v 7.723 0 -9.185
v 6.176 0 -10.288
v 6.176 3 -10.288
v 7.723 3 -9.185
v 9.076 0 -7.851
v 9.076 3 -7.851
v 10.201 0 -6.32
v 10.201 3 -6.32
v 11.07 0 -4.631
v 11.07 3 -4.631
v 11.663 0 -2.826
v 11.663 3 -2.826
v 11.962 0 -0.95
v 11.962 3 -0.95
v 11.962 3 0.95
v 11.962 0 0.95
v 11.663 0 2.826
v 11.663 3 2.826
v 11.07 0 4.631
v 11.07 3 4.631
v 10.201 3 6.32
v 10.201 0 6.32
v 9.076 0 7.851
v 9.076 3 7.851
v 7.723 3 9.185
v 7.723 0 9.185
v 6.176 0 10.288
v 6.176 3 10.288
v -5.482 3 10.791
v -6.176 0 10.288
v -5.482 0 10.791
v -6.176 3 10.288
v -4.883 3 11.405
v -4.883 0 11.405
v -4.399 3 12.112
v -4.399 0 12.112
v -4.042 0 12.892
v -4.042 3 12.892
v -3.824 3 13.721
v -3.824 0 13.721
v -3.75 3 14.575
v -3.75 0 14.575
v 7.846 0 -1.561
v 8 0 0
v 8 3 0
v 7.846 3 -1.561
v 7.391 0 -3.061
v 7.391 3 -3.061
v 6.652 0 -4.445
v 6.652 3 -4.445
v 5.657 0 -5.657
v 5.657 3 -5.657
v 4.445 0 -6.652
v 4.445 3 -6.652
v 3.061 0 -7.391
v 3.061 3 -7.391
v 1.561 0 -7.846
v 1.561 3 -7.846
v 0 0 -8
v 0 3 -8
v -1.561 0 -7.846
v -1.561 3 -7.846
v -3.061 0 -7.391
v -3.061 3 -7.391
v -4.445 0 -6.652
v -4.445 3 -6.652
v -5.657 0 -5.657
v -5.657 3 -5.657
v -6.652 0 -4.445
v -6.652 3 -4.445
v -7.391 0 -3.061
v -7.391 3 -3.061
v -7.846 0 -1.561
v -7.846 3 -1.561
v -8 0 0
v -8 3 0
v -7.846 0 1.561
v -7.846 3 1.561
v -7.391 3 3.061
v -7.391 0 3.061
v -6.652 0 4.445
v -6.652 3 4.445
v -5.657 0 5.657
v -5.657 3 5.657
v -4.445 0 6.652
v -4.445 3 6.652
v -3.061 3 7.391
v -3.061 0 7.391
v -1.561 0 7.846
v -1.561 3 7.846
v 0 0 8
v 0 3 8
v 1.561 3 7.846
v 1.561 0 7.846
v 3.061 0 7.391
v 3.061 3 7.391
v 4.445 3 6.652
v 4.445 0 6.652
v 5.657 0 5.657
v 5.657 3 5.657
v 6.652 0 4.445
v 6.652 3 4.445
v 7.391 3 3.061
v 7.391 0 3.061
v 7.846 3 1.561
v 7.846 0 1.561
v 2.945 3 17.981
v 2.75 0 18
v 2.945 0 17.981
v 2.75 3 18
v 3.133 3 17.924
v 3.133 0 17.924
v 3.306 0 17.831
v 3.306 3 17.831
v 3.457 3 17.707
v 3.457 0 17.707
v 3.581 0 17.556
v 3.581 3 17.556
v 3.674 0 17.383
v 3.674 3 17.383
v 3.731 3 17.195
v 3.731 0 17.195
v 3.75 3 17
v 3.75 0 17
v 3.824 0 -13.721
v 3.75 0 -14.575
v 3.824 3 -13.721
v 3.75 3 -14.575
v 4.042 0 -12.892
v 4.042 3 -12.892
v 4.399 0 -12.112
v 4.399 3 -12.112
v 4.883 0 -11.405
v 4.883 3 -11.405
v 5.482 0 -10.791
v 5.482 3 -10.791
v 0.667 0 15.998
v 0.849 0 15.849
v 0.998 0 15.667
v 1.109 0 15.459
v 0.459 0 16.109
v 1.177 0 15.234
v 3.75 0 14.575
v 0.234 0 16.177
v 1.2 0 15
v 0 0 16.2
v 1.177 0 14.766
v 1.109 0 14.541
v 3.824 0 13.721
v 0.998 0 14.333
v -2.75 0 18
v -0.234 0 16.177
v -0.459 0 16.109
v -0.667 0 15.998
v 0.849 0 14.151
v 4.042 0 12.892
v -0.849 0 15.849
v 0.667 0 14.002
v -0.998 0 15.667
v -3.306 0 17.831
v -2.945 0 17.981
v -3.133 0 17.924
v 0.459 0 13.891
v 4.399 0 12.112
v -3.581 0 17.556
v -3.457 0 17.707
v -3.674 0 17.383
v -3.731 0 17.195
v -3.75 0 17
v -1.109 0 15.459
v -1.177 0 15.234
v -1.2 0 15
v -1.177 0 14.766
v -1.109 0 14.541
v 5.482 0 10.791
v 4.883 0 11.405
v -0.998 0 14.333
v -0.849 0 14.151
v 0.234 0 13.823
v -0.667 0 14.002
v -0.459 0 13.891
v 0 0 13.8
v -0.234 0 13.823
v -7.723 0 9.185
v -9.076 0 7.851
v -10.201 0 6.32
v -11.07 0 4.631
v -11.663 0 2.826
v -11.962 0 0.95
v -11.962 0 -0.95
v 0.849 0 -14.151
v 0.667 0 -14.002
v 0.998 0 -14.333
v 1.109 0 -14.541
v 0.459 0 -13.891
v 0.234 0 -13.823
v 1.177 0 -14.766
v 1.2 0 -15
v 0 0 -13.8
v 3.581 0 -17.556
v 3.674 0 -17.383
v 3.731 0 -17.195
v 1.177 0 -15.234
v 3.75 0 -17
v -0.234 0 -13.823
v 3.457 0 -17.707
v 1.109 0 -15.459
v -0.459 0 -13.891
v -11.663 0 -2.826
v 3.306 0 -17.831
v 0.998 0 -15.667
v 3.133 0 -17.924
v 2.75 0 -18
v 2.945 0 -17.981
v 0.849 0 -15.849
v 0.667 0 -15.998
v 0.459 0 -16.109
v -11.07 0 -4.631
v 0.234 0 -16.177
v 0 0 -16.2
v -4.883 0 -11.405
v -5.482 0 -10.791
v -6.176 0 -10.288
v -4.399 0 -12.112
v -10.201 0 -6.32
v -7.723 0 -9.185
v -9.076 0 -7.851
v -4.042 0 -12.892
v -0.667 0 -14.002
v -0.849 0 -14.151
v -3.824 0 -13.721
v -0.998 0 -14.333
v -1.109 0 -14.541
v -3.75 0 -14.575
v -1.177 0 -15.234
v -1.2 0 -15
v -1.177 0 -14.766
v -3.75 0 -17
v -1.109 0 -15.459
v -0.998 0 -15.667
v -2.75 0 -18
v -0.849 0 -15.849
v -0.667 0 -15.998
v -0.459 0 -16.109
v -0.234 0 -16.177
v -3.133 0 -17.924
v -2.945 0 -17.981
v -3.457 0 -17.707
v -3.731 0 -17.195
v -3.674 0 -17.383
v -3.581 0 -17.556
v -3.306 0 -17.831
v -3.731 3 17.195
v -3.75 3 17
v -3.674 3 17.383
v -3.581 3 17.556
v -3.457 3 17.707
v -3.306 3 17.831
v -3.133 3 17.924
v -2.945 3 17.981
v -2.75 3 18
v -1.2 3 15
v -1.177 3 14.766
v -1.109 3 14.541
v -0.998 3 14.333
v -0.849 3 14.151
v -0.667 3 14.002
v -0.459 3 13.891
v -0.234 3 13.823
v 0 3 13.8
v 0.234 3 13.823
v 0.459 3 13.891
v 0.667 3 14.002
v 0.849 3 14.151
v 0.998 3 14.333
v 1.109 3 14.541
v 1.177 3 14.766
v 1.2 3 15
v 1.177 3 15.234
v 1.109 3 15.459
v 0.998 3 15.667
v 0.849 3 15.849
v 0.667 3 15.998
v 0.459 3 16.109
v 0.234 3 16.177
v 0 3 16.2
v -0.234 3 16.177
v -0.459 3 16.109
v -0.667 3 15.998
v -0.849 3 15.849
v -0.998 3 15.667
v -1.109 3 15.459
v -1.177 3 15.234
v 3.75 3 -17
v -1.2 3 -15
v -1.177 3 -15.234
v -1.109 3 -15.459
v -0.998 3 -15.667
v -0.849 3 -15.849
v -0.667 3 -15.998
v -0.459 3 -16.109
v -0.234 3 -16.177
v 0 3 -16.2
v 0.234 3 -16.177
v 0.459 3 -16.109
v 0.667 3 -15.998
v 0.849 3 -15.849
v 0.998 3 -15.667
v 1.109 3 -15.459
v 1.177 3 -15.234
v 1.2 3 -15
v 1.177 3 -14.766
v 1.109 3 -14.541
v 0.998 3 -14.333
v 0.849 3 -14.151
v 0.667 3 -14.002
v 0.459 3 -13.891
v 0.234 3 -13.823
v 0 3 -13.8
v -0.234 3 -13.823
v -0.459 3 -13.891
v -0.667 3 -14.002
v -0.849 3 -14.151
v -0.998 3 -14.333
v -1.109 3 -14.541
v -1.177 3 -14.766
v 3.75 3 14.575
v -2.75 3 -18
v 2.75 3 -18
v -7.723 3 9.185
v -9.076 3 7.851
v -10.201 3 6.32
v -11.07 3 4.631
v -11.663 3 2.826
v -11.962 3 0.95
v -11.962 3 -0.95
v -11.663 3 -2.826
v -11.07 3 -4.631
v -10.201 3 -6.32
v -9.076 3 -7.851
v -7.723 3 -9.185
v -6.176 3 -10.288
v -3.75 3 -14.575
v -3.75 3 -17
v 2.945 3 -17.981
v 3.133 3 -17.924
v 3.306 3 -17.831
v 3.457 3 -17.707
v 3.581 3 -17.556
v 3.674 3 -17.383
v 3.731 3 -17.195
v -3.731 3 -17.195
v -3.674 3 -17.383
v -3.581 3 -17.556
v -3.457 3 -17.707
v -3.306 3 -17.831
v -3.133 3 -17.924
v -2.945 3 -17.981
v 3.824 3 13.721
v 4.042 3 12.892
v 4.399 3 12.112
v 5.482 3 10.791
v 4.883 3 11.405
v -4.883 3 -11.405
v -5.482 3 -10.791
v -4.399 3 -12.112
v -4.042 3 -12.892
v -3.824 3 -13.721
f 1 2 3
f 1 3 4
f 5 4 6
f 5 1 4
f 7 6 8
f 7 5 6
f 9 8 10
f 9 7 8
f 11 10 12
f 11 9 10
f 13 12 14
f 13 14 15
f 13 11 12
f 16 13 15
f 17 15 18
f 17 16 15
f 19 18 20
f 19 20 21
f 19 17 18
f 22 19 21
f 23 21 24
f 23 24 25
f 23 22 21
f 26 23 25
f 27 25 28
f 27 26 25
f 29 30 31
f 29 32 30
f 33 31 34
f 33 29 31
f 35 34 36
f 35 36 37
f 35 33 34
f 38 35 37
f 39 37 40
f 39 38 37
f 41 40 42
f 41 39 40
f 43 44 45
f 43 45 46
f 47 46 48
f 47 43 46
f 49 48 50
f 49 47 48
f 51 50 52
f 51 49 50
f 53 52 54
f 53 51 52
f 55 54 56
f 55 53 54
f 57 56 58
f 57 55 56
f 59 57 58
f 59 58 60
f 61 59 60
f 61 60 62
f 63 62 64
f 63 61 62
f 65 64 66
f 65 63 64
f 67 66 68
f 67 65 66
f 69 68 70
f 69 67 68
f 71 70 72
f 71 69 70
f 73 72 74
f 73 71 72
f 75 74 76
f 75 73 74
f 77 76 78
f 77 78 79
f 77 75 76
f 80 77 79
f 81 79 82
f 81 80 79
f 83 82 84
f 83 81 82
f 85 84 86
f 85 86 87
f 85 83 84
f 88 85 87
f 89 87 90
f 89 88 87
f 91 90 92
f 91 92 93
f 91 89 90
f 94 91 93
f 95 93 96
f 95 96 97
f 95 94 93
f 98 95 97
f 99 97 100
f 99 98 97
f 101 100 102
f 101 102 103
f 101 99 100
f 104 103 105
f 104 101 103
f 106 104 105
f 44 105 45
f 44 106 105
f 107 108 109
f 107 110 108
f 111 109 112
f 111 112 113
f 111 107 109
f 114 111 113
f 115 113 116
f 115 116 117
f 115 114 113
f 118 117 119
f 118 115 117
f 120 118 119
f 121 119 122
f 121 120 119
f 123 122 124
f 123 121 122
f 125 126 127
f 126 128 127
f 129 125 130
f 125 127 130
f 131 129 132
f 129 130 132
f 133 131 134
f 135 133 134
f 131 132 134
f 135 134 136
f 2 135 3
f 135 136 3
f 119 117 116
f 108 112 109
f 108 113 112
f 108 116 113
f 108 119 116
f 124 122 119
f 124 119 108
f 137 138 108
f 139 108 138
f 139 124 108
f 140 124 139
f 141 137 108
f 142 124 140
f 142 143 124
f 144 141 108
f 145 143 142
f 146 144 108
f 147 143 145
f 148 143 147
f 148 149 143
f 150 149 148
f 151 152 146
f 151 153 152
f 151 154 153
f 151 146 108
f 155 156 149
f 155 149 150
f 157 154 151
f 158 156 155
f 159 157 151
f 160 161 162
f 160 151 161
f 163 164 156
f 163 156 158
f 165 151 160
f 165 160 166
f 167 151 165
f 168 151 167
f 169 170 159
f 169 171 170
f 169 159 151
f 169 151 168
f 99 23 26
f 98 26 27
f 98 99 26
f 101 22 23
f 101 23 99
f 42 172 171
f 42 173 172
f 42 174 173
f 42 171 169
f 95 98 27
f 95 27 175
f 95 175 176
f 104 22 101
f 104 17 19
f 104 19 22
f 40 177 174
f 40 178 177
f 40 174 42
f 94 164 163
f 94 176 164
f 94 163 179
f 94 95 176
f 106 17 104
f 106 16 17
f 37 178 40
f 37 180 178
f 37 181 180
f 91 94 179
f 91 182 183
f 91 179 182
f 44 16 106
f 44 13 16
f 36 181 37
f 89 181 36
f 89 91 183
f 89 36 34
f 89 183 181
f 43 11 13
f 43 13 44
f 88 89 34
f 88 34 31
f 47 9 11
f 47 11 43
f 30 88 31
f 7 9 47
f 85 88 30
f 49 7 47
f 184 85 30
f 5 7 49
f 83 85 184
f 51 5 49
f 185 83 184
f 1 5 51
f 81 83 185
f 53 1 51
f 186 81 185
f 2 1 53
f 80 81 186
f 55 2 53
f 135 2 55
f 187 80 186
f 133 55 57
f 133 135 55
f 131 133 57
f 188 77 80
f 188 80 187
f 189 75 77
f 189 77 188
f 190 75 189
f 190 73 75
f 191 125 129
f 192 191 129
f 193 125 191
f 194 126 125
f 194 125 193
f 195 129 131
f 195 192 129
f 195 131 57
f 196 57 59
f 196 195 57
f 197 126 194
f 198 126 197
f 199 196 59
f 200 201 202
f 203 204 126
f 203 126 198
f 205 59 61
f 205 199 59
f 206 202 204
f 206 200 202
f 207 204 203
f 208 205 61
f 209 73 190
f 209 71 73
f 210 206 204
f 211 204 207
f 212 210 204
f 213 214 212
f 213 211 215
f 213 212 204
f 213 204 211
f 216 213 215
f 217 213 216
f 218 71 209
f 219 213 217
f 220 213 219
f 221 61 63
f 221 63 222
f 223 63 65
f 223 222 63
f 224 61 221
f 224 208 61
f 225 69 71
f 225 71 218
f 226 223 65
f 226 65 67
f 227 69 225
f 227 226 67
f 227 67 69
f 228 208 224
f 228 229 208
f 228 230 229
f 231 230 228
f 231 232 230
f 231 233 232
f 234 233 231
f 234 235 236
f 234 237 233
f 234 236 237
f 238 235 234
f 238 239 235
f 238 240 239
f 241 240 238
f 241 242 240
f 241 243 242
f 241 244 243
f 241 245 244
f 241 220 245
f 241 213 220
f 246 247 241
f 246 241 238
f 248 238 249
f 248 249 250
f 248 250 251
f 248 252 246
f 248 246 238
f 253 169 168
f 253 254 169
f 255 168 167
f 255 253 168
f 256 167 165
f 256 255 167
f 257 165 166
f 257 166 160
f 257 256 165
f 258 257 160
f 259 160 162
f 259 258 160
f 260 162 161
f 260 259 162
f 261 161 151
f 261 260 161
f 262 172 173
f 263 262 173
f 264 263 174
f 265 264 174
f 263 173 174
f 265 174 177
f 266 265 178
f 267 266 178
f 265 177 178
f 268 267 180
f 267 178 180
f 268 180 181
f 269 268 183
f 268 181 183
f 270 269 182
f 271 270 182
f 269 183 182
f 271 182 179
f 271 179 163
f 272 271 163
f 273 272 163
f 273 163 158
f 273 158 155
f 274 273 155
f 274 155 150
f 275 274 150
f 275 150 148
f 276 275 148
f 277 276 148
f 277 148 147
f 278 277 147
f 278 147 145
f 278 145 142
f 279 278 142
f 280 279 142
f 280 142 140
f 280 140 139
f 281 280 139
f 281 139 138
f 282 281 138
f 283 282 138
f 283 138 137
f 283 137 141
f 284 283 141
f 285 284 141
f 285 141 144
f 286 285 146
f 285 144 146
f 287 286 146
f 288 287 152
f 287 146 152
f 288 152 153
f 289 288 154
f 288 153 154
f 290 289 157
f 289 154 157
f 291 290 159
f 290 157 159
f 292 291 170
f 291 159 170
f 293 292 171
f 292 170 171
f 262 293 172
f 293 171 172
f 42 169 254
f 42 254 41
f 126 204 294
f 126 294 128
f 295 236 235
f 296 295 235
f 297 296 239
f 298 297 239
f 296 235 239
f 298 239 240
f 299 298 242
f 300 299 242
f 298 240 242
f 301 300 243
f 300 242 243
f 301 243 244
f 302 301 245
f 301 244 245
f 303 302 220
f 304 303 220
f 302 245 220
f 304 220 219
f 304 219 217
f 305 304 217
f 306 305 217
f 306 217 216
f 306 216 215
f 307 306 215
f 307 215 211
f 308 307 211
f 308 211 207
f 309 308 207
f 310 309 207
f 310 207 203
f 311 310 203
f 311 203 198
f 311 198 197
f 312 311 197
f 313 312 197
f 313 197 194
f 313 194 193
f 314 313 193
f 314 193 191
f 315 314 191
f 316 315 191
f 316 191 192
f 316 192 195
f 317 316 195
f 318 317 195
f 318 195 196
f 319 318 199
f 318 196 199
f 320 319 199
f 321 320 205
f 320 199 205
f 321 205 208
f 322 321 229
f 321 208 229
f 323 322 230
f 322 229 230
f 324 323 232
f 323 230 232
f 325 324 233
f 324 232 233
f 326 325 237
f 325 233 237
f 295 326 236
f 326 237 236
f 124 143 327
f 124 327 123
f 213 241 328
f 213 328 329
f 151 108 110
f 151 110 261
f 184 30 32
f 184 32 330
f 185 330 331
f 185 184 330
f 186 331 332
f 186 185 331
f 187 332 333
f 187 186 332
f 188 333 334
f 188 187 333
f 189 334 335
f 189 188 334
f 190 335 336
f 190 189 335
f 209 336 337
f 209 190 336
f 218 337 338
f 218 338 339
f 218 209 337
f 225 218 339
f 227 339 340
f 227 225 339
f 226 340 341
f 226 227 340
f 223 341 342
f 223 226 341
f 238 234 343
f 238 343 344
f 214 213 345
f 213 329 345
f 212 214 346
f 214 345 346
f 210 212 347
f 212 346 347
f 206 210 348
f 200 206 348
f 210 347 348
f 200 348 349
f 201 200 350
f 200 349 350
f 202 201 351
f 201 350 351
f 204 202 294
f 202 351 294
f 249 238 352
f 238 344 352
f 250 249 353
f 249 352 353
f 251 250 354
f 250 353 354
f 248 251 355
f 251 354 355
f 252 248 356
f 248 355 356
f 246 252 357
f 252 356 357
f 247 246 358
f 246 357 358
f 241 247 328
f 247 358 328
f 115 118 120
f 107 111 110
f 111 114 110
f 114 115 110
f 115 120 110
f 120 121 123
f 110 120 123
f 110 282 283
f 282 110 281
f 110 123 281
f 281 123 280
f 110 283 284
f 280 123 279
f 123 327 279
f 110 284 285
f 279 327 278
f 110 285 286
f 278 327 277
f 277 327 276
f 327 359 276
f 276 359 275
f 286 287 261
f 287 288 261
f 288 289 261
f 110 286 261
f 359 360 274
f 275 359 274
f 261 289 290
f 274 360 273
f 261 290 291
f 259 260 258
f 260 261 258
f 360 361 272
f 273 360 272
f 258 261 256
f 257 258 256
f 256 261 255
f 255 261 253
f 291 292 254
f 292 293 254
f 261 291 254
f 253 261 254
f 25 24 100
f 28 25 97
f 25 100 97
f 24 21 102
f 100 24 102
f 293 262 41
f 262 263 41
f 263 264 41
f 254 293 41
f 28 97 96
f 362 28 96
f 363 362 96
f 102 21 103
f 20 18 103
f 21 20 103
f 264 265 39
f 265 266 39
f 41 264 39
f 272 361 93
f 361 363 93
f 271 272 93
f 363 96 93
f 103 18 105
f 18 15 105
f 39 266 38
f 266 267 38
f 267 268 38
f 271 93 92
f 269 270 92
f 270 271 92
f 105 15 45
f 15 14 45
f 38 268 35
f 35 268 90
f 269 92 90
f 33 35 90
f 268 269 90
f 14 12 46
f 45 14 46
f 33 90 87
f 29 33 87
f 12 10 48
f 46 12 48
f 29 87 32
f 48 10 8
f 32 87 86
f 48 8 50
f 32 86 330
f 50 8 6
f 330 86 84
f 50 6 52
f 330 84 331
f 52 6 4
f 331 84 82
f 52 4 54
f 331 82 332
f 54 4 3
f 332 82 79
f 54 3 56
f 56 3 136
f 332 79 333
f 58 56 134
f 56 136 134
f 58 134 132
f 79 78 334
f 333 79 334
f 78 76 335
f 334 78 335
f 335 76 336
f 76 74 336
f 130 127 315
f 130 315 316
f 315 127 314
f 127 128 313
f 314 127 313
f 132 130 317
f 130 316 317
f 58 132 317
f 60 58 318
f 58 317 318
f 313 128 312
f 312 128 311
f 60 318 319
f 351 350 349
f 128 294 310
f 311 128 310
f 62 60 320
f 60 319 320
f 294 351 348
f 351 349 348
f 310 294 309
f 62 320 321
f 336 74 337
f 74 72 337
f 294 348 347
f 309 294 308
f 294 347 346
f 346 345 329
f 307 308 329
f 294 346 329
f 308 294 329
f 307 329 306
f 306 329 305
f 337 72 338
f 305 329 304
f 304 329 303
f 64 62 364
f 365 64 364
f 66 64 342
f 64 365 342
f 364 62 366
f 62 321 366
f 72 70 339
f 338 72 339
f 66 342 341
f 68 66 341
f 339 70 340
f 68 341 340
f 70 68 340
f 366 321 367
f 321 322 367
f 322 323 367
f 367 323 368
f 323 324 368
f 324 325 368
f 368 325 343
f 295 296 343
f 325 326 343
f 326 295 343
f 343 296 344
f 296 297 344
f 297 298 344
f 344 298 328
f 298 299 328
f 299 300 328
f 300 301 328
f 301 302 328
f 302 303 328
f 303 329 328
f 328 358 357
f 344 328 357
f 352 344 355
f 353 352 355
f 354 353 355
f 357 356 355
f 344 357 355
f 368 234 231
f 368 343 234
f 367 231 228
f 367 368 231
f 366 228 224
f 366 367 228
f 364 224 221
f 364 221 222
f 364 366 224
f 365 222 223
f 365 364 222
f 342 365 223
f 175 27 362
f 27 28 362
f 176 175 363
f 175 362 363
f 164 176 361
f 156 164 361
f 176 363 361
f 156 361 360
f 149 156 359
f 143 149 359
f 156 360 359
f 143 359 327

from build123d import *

# Parameters (mm, degrees)
SKETCH1_R            = 8
BOSS_EXTRUDE1_DEPTH  = 3
M2_CLEARANCE_HOLE1_D = 2.4
FILLET1_R            = 5
FILLET2_R            = 1


with BuildPart() as part:
    # Sketch1 → Boss-Extrude1 (new body)
    with BuildSketch(Plane(origin=(0, 0, 0), x_dir=(1, 0, 0), z_dir=(0, 1, 0))):
        with BuildLine():
            Line((-3.75, 18), (3.75, 18))
            Line((3.75, 18), (3.75, 11.399013115))
            ThreePointArc((3.75, 11.399013115), (12, 0), (3.75, -11.399013115))
            Line((3.75, -11.399013115), (3.75, -18))
            Line((3.75, -18), (-3.75, -18))
            Line((-3.75, -18), (-3.75, -11.399013115))
            ThreePointArc((-3.75, -11.399013115), (-12, 0), (-3.75, 11.399013115))
            Line((-3.75, 11.399013115), (-3.75, 18))
        make_face()
        Circle(SKETCH1_R, mode=Mode.SUBTRACT)
    extrude(amount=BOSS_EXTRUDE1_DEPTH)

    # M2 Clearance Hole1 (through all)
    with Locations(Plane(origin=(0, 3, 0), x_dir=(1, 0, 0), z_dir=(0, 1, 0))):
        with Locations((0, -15), (0, 15)):
            Hole(M2_CLEARANCE_HOLE1_D / 2)

    # Fillet1
    fillet1_edges = [part.edges().sort_by_distance(p)[0] for p in [
        (3.75, 1.5, -11.399013115),
        (3.75, 1.5, 11.399013115),
        (-3.75, 1.5, 11.399013115),
        (-3.75, 1.5, -11.399013115),
    ]]
    fillet(fillet1_edges, radius=FILLET1_R)

    # Fillet2
    fillet2_edges = [part.edges().sort_by_distance(p)[0] for p in [
        (3.75, 1.5, 18),
        (-3.75, 1.5, 18),
        (-3.75, 1.5, -18),
        (3.75, 1.5, -18),
    ]]
    fillet(fillet2_edges, radius=FILLET2_R)


solid = part.part
